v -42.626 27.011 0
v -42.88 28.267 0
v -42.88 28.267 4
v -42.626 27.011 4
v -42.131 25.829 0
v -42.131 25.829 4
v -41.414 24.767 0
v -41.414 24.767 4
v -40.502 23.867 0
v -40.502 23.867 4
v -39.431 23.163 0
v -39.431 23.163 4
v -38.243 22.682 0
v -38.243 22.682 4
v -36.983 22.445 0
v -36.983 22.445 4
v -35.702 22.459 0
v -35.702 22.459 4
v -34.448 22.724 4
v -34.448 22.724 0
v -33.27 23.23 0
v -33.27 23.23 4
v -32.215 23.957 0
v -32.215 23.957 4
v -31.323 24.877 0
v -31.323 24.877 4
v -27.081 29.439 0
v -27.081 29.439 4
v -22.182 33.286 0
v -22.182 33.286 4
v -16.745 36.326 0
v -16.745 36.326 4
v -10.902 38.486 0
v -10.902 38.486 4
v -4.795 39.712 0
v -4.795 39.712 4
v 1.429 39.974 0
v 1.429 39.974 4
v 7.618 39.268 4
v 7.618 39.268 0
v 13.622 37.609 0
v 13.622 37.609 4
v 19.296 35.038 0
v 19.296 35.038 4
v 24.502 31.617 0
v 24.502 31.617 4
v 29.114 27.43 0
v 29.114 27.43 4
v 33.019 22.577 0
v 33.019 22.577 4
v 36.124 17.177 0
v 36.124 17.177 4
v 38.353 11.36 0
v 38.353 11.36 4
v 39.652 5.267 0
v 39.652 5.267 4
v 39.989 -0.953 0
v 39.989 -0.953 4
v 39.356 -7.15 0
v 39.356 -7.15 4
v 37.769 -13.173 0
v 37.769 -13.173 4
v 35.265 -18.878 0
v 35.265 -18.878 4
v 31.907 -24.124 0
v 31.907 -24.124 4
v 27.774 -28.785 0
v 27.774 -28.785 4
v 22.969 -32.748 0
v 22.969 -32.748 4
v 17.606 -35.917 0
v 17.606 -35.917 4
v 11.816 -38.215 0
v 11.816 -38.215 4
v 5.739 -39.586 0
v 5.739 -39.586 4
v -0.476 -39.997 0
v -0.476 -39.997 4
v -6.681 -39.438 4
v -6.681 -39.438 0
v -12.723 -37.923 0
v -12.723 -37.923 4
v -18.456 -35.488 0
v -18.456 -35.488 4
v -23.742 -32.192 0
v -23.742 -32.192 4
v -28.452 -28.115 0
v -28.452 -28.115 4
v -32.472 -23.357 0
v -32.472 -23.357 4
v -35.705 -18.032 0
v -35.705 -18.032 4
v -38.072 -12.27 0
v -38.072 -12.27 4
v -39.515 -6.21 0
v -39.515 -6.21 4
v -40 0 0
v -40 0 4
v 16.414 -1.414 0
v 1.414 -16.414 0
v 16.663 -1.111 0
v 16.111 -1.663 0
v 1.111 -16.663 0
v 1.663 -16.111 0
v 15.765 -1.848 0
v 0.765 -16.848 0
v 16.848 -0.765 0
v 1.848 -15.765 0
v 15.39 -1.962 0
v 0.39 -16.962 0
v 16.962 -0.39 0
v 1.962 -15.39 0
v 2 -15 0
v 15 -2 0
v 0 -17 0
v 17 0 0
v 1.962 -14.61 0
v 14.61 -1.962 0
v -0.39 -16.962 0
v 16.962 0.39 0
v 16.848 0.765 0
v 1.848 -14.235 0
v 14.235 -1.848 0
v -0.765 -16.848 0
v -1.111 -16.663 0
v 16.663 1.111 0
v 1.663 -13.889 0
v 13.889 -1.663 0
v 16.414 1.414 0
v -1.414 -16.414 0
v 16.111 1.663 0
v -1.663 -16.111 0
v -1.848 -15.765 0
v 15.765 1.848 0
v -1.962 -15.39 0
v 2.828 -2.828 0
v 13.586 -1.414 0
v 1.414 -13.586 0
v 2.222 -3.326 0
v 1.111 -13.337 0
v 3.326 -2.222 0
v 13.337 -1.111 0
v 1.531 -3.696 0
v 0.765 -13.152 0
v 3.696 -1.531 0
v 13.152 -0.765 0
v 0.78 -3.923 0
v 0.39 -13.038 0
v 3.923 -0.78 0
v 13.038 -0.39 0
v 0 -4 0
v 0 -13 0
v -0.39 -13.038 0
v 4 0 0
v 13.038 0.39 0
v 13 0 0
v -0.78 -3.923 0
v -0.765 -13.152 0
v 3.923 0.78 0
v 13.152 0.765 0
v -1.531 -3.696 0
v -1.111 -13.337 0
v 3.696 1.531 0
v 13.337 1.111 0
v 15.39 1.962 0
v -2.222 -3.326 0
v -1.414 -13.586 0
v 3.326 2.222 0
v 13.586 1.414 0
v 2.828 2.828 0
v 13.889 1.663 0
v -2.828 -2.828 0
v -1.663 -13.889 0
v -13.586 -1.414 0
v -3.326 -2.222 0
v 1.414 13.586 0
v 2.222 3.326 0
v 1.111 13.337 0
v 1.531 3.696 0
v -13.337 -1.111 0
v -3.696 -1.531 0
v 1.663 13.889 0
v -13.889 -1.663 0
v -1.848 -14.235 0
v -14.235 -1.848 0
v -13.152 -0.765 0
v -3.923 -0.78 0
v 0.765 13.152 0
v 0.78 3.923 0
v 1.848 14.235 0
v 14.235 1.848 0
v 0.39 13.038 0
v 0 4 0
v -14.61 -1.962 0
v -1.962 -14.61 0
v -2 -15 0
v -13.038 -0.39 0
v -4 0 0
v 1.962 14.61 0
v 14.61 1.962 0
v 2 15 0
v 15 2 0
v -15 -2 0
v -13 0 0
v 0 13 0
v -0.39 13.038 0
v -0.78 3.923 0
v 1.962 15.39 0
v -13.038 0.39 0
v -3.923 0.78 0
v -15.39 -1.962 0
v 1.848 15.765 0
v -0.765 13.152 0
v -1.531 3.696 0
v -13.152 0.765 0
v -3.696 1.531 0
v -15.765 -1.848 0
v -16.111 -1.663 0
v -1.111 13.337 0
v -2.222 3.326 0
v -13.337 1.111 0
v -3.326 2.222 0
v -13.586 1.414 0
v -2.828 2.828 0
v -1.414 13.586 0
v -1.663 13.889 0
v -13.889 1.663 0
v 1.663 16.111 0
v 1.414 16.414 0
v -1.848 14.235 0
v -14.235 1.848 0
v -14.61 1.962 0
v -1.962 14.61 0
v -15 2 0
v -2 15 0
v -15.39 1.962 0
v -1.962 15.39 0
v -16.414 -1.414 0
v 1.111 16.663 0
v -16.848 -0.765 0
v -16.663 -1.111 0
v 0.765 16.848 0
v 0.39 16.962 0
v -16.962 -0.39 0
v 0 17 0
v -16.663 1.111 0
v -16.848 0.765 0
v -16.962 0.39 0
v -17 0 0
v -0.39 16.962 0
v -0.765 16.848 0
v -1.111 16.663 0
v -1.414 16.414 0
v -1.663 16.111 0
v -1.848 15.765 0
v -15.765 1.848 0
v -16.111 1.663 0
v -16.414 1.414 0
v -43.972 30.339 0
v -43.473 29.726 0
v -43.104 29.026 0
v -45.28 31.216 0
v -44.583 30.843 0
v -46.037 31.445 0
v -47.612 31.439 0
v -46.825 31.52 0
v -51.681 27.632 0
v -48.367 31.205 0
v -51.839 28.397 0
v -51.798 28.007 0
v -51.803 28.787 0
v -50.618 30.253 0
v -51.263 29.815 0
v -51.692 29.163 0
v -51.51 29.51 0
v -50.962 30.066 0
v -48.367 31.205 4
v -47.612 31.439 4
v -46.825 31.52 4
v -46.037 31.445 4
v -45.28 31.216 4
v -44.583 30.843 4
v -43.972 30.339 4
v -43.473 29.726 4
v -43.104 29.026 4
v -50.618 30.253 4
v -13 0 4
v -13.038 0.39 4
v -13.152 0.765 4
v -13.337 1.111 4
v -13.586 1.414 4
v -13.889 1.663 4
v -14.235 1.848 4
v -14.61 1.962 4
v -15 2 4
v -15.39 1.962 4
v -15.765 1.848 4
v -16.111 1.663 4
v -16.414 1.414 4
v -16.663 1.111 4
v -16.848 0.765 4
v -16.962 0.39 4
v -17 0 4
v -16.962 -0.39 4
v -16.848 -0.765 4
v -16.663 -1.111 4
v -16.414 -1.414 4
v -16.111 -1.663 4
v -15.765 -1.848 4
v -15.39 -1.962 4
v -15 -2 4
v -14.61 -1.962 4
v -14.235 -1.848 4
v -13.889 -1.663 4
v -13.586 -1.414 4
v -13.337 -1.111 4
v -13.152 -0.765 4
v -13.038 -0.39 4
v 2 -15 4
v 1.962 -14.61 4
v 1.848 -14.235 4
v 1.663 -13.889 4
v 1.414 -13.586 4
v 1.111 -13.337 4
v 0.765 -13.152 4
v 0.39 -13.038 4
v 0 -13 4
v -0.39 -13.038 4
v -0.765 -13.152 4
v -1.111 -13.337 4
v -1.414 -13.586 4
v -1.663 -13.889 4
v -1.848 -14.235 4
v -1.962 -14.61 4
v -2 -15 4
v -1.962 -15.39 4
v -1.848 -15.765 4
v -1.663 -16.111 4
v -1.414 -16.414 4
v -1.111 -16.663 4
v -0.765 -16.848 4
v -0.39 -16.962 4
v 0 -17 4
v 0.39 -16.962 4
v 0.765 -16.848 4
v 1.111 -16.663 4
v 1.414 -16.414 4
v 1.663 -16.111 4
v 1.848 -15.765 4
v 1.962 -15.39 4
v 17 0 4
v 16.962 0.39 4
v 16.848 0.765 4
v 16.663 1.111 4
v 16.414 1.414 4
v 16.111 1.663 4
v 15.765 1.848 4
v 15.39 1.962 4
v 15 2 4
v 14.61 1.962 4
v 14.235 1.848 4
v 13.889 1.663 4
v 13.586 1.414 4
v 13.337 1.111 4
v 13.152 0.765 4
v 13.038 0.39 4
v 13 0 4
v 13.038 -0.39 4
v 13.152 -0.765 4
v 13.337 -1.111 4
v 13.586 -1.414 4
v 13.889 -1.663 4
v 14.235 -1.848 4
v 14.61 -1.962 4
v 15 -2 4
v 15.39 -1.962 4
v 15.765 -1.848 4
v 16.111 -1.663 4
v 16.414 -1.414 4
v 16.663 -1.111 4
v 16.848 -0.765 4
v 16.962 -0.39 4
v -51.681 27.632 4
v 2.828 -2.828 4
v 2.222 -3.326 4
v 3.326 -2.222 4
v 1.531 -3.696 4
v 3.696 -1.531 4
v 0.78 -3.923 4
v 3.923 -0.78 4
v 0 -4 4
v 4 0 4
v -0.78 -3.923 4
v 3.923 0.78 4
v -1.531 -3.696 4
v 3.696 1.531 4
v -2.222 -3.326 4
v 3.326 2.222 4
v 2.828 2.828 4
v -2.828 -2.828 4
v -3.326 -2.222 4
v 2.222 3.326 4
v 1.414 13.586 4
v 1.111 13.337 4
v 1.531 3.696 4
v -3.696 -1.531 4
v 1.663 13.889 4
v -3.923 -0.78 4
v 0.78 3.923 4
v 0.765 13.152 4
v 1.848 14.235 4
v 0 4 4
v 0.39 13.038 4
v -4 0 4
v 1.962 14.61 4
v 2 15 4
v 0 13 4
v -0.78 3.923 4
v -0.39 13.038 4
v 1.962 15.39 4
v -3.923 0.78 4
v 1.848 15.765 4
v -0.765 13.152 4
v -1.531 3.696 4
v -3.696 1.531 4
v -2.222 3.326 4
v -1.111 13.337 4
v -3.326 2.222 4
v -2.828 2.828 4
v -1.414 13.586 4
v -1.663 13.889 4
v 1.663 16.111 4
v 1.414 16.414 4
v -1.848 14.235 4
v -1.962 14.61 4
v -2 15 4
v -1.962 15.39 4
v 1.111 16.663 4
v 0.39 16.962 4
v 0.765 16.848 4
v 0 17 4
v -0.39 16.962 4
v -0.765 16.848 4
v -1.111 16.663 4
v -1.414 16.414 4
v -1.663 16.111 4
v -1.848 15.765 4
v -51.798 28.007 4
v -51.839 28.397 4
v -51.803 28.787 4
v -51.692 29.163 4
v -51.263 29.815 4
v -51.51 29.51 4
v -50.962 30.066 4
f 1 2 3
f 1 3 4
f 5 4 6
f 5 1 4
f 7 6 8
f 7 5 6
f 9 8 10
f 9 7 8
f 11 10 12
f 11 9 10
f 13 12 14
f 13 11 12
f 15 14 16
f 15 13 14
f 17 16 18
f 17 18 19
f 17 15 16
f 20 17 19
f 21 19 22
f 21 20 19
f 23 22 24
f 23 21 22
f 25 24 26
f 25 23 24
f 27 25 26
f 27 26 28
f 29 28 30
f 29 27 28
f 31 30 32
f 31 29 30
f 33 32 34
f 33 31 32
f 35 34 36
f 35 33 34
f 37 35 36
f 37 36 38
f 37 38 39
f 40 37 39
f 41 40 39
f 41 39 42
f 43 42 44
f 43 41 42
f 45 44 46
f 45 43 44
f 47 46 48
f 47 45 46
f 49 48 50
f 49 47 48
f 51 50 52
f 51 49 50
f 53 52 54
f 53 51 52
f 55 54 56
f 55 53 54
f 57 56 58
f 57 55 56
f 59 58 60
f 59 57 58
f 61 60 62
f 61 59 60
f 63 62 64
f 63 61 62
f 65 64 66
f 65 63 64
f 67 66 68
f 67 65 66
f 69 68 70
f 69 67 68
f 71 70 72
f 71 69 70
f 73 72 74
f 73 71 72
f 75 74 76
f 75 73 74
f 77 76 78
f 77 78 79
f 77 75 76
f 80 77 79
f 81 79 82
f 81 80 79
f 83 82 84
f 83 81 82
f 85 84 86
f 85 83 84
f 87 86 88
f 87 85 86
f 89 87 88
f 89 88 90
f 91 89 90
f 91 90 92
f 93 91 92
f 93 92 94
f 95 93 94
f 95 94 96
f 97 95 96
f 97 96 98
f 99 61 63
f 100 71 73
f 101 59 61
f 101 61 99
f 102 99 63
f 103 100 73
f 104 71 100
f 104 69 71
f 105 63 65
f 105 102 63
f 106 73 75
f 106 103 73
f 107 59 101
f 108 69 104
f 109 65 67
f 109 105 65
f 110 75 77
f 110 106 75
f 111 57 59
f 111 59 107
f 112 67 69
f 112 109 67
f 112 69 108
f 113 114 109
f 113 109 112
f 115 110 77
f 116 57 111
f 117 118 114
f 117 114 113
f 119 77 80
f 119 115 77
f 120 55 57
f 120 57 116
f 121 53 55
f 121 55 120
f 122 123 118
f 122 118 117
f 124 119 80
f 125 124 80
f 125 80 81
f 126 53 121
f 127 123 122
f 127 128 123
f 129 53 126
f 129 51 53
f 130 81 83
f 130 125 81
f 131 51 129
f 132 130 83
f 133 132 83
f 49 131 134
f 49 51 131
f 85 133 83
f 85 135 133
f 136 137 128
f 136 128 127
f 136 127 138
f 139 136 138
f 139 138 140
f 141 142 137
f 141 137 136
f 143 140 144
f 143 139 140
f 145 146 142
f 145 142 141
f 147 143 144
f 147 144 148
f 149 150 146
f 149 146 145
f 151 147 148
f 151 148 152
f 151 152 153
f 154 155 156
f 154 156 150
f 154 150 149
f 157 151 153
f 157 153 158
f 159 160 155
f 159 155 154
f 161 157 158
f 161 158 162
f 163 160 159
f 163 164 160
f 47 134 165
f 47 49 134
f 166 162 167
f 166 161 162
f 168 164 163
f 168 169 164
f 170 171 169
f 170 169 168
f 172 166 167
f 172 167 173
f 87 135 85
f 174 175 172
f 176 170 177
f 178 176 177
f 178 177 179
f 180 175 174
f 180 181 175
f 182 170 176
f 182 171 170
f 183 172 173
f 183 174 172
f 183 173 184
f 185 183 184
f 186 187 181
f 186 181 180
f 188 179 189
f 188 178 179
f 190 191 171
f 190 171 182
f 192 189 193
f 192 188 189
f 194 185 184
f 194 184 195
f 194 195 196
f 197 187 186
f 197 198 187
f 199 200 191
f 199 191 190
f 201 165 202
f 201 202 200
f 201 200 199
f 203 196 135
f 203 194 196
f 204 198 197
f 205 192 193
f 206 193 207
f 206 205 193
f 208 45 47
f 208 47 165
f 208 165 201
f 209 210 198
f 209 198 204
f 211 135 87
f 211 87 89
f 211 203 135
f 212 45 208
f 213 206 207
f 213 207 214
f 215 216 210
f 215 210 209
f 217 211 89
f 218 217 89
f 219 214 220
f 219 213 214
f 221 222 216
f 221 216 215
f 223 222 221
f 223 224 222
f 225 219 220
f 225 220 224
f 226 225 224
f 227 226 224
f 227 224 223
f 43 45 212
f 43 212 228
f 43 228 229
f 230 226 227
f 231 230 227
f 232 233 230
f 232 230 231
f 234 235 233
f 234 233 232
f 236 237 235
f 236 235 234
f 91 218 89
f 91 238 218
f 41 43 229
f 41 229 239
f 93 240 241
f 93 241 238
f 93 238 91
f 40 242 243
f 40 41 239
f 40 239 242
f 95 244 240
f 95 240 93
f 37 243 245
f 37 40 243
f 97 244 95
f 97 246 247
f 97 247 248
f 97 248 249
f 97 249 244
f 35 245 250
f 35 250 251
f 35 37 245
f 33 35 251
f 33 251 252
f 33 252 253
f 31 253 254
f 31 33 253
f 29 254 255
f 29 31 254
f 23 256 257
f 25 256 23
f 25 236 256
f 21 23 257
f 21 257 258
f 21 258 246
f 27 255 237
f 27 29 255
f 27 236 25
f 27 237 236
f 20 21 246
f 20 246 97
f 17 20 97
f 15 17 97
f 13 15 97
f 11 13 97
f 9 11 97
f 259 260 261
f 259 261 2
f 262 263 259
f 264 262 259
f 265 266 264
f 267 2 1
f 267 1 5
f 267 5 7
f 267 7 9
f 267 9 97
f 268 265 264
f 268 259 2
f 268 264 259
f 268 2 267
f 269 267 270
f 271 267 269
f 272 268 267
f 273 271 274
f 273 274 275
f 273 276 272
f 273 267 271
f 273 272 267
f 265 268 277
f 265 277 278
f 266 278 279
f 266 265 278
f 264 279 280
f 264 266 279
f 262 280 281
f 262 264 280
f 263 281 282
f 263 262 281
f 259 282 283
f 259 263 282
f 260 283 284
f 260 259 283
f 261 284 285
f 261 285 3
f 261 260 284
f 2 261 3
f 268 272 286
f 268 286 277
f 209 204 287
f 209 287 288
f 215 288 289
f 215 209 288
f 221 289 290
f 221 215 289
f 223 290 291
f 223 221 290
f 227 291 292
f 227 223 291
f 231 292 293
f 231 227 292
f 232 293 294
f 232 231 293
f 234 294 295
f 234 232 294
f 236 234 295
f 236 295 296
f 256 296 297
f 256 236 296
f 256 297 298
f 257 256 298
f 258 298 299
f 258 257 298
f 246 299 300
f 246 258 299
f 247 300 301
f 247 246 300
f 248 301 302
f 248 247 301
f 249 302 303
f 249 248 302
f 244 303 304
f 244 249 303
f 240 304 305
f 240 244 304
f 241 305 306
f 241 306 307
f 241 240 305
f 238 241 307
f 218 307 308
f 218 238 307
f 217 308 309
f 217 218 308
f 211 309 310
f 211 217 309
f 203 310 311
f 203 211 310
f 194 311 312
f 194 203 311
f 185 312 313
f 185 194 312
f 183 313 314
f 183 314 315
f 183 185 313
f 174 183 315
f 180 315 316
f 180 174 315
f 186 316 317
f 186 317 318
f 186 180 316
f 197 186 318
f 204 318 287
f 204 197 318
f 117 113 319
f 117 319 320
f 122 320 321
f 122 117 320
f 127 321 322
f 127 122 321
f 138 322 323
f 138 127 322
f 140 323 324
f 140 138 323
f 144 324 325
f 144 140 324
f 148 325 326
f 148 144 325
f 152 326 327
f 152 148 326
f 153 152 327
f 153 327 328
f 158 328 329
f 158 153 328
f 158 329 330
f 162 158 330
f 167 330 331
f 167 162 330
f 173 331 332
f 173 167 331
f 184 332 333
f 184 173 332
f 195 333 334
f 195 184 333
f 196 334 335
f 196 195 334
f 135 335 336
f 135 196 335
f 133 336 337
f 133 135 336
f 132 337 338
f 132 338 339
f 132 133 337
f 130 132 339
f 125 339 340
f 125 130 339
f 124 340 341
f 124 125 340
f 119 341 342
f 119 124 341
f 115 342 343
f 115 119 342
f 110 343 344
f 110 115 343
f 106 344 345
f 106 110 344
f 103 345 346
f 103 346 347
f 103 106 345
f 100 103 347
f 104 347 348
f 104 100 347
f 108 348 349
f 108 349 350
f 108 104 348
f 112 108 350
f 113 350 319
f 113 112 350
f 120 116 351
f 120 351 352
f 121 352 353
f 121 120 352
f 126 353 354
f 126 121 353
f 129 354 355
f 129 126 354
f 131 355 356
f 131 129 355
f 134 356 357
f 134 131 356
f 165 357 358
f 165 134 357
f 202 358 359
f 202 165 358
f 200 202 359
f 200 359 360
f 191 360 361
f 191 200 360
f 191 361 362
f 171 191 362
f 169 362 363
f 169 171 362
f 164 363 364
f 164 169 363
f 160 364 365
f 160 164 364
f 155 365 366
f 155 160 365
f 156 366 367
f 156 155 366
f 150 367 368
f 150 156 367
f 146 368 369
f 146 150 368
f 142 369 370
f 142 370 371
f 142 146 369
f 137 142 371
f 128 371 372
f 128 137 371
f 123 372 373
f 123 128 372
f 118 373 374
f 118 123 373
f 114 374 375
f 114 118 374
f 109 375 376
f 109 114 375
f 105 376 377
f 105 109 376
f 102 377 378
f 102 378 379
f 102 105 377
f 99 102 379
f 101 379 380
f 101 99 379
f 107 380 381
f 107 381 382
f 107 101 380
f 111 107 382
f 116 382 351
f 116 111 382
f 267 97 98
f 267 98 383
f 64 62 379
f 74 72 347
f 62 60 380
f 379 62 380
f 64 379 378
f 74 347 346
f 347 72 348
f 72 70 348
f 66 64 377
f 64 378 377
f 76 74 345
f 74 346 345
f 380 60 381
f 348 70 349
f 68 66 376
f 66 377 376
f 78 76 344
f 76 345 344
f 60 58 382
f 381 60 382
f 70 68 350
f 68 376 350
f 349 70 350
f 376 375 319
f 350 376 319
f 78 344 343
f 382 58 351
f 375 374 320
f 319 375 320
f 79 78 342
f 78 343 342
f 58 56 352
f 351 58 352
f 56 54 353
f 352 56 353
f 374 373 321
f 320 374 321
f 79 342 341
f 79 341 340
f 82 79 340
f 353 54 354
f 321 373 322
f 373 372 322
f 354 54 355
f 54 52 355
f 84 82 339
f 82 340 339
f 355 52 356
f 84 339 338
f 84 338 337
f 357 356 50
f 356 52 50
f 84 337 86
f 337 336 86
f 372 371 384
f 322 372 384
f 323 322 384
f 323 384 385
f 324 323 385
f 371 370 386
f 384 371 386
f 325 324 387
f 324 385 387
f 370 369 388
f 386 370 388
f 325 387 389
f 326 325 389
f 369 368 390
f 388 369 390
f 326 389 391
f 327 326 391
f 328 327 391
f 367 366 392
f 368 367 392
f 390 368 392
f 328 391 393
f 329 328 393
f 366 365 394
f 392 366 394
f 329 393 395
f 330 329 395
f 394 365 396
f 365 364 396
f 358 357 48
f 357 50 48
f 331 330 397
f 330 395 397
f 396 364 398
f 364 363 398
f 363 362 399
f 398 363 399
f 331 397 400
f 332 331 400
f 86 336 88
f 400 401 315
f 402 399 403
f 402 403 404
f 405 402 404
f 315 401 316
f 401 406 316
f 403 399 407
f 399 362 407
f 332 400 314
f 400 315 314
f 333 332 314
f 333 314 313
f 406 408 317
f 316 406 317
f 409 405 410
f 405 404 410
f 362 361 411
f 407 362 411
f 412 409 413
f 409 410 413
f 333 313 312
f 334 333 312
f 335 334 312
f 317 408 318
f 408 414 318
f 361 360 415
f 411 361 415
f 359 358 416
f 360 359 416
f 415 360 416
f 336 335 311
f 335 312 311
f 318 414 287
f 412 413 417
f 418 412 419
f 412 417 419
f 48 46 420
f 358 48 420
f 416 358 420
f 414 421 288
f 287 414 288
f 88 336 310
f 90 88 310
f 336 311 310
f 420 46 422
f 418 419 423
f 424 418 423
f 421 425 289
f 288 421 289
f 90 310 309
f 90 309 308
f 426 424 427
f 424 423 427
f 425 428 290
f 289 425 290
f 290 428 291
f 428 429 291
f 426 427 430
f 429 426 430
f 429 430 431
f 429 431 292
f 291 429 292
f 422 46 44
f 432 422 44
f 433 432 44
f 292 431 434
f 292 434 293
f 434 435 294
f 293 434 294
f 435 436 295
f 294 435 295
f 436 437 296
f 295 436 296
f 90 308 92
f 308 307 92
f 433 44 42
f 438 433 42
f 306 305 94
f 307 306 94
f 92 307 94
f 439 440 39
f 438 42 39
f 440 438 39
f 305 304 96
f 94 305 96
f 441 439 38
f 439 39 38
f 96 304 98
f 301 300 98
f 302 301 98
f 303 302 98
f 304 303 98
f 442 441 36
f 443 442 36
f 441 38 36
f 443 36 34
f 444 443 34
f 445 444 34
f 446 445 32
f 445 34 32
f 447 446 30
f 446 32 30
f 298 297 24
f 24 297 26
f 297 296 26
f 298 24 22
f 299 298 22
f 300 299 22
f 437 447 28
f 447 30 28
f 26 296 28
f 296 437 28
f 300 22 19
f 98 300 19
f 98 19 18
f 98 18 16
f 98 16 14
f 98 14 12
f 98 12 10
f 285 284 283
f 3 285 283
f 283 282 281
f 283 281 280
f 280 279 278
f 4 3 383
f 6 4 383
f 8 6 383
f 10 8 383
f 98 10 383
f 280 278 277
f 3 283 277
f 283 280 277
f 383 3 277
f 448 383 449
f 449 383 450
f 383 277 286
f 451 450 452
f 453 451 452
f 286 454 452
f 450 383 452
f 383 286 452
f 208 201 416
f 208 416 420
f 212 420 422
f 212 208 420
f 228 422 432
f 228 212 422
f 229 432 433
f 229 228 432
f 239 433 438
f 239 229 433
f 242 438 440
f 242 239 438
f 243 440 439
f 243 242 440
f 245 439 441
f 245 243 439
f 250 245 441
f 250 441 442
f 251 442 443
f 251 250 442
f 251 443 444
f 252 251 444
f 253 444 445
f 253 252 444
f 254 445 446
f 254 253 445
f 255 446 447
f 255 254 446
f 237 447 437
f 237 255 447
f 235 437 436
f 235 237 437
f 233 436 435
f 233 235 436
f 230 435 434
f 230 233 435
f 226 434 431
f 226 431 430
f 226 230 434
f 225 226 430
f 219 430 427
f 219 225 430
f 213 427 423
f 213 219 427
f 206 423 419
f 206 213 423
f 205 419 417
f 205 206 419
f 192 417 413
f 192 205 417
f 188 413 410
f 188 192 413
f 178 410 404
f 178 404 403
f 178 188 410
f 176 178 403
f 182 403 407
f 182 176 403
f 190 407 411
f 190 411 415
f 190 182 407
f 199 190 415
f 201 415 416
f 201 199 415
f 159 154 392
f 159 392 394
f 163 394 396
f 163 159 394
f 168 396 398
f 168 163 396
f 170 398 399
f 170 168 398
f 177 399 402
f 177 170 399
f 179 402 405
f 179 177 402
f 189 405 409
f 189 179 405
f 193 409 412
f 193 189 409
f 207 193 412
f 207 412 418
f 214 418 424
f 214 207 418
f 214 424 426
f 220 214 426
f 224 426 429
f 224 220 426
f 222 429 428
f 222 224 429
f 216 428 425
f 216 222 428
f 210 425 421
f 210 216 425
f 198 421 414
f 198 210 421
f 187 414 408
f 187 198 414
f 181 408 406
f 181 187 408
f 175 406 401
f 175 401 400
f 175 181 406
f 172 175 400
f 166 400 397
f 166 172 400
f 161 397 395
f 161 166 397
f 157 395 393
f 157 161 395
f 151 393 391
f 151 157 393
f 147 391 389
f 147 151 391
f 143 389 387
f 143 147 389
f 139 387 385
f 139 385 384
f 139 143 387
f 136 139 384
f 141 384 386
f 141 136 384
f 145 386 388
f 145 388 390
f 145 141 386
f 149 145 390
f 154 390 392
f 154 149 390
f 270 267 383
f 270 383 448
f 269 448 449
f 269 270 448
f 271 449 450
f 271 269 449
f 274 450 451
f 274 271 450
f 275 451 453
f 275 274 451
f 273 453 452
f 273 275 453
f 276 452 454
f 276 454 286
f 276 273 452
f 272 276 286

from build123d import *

# Parameters (mm, degrees)
SKETCH1_R           = 4
SKETCH1_R_2         = 2
BOSS_EXTRUDE1_DEPTH = 4


with BuildPart() as part:
    # Sketch1 → Boss-Extrude1 (new body)
    with BuildSketch(Plane.XY):
        with BuildLine():
            Line((-40, 0), (-51.681216052, 27.63239388))
            ThreePointArc((-51.681216052, 27.63239388), (-51.692317805, 29.163087351), (-50.617804197, 30.253301209))
            Line((-50.617804197, 30.253301209), (-48.367404943, 31.204626671))
            ThreePointArc((-48.367404943, 31.204626671), (-44.922000222, 31.046750266), (-42.880225189, 28.267021256))
            ThreePointArc((-42.880225189, 28.267021256), (-38.242591008, 22.682316206), (-31.323061762, 24.877013524))
            ThreePointArc((-31.323061762, 24.877013524), (37.768521751, -13.17341128), (-40, 0))
        make_face()
        Circle(SKETCH1_R, mode=Mode.SUBTRACT)
        with Locations((0, 15)):
            Circle(SKETCH1_R_2, mode=Mode.SUBTRACT)
        with Locations((15, 0)):
            Circle(SKETCH1_R_2, mode=Mode.SUBTRACT)
        with Locations((0, -15)):
            Circle(SKETCH1_R_2, mode=Mode.SUBTRACT)
        with Locations((-15, 0)):
            Circle(SKETCH1_R_2, mode=Mode.SUBTRACT)
    extrude(amount=BOSS_EXTRUDE1_DEPTH)


solid = part.part
